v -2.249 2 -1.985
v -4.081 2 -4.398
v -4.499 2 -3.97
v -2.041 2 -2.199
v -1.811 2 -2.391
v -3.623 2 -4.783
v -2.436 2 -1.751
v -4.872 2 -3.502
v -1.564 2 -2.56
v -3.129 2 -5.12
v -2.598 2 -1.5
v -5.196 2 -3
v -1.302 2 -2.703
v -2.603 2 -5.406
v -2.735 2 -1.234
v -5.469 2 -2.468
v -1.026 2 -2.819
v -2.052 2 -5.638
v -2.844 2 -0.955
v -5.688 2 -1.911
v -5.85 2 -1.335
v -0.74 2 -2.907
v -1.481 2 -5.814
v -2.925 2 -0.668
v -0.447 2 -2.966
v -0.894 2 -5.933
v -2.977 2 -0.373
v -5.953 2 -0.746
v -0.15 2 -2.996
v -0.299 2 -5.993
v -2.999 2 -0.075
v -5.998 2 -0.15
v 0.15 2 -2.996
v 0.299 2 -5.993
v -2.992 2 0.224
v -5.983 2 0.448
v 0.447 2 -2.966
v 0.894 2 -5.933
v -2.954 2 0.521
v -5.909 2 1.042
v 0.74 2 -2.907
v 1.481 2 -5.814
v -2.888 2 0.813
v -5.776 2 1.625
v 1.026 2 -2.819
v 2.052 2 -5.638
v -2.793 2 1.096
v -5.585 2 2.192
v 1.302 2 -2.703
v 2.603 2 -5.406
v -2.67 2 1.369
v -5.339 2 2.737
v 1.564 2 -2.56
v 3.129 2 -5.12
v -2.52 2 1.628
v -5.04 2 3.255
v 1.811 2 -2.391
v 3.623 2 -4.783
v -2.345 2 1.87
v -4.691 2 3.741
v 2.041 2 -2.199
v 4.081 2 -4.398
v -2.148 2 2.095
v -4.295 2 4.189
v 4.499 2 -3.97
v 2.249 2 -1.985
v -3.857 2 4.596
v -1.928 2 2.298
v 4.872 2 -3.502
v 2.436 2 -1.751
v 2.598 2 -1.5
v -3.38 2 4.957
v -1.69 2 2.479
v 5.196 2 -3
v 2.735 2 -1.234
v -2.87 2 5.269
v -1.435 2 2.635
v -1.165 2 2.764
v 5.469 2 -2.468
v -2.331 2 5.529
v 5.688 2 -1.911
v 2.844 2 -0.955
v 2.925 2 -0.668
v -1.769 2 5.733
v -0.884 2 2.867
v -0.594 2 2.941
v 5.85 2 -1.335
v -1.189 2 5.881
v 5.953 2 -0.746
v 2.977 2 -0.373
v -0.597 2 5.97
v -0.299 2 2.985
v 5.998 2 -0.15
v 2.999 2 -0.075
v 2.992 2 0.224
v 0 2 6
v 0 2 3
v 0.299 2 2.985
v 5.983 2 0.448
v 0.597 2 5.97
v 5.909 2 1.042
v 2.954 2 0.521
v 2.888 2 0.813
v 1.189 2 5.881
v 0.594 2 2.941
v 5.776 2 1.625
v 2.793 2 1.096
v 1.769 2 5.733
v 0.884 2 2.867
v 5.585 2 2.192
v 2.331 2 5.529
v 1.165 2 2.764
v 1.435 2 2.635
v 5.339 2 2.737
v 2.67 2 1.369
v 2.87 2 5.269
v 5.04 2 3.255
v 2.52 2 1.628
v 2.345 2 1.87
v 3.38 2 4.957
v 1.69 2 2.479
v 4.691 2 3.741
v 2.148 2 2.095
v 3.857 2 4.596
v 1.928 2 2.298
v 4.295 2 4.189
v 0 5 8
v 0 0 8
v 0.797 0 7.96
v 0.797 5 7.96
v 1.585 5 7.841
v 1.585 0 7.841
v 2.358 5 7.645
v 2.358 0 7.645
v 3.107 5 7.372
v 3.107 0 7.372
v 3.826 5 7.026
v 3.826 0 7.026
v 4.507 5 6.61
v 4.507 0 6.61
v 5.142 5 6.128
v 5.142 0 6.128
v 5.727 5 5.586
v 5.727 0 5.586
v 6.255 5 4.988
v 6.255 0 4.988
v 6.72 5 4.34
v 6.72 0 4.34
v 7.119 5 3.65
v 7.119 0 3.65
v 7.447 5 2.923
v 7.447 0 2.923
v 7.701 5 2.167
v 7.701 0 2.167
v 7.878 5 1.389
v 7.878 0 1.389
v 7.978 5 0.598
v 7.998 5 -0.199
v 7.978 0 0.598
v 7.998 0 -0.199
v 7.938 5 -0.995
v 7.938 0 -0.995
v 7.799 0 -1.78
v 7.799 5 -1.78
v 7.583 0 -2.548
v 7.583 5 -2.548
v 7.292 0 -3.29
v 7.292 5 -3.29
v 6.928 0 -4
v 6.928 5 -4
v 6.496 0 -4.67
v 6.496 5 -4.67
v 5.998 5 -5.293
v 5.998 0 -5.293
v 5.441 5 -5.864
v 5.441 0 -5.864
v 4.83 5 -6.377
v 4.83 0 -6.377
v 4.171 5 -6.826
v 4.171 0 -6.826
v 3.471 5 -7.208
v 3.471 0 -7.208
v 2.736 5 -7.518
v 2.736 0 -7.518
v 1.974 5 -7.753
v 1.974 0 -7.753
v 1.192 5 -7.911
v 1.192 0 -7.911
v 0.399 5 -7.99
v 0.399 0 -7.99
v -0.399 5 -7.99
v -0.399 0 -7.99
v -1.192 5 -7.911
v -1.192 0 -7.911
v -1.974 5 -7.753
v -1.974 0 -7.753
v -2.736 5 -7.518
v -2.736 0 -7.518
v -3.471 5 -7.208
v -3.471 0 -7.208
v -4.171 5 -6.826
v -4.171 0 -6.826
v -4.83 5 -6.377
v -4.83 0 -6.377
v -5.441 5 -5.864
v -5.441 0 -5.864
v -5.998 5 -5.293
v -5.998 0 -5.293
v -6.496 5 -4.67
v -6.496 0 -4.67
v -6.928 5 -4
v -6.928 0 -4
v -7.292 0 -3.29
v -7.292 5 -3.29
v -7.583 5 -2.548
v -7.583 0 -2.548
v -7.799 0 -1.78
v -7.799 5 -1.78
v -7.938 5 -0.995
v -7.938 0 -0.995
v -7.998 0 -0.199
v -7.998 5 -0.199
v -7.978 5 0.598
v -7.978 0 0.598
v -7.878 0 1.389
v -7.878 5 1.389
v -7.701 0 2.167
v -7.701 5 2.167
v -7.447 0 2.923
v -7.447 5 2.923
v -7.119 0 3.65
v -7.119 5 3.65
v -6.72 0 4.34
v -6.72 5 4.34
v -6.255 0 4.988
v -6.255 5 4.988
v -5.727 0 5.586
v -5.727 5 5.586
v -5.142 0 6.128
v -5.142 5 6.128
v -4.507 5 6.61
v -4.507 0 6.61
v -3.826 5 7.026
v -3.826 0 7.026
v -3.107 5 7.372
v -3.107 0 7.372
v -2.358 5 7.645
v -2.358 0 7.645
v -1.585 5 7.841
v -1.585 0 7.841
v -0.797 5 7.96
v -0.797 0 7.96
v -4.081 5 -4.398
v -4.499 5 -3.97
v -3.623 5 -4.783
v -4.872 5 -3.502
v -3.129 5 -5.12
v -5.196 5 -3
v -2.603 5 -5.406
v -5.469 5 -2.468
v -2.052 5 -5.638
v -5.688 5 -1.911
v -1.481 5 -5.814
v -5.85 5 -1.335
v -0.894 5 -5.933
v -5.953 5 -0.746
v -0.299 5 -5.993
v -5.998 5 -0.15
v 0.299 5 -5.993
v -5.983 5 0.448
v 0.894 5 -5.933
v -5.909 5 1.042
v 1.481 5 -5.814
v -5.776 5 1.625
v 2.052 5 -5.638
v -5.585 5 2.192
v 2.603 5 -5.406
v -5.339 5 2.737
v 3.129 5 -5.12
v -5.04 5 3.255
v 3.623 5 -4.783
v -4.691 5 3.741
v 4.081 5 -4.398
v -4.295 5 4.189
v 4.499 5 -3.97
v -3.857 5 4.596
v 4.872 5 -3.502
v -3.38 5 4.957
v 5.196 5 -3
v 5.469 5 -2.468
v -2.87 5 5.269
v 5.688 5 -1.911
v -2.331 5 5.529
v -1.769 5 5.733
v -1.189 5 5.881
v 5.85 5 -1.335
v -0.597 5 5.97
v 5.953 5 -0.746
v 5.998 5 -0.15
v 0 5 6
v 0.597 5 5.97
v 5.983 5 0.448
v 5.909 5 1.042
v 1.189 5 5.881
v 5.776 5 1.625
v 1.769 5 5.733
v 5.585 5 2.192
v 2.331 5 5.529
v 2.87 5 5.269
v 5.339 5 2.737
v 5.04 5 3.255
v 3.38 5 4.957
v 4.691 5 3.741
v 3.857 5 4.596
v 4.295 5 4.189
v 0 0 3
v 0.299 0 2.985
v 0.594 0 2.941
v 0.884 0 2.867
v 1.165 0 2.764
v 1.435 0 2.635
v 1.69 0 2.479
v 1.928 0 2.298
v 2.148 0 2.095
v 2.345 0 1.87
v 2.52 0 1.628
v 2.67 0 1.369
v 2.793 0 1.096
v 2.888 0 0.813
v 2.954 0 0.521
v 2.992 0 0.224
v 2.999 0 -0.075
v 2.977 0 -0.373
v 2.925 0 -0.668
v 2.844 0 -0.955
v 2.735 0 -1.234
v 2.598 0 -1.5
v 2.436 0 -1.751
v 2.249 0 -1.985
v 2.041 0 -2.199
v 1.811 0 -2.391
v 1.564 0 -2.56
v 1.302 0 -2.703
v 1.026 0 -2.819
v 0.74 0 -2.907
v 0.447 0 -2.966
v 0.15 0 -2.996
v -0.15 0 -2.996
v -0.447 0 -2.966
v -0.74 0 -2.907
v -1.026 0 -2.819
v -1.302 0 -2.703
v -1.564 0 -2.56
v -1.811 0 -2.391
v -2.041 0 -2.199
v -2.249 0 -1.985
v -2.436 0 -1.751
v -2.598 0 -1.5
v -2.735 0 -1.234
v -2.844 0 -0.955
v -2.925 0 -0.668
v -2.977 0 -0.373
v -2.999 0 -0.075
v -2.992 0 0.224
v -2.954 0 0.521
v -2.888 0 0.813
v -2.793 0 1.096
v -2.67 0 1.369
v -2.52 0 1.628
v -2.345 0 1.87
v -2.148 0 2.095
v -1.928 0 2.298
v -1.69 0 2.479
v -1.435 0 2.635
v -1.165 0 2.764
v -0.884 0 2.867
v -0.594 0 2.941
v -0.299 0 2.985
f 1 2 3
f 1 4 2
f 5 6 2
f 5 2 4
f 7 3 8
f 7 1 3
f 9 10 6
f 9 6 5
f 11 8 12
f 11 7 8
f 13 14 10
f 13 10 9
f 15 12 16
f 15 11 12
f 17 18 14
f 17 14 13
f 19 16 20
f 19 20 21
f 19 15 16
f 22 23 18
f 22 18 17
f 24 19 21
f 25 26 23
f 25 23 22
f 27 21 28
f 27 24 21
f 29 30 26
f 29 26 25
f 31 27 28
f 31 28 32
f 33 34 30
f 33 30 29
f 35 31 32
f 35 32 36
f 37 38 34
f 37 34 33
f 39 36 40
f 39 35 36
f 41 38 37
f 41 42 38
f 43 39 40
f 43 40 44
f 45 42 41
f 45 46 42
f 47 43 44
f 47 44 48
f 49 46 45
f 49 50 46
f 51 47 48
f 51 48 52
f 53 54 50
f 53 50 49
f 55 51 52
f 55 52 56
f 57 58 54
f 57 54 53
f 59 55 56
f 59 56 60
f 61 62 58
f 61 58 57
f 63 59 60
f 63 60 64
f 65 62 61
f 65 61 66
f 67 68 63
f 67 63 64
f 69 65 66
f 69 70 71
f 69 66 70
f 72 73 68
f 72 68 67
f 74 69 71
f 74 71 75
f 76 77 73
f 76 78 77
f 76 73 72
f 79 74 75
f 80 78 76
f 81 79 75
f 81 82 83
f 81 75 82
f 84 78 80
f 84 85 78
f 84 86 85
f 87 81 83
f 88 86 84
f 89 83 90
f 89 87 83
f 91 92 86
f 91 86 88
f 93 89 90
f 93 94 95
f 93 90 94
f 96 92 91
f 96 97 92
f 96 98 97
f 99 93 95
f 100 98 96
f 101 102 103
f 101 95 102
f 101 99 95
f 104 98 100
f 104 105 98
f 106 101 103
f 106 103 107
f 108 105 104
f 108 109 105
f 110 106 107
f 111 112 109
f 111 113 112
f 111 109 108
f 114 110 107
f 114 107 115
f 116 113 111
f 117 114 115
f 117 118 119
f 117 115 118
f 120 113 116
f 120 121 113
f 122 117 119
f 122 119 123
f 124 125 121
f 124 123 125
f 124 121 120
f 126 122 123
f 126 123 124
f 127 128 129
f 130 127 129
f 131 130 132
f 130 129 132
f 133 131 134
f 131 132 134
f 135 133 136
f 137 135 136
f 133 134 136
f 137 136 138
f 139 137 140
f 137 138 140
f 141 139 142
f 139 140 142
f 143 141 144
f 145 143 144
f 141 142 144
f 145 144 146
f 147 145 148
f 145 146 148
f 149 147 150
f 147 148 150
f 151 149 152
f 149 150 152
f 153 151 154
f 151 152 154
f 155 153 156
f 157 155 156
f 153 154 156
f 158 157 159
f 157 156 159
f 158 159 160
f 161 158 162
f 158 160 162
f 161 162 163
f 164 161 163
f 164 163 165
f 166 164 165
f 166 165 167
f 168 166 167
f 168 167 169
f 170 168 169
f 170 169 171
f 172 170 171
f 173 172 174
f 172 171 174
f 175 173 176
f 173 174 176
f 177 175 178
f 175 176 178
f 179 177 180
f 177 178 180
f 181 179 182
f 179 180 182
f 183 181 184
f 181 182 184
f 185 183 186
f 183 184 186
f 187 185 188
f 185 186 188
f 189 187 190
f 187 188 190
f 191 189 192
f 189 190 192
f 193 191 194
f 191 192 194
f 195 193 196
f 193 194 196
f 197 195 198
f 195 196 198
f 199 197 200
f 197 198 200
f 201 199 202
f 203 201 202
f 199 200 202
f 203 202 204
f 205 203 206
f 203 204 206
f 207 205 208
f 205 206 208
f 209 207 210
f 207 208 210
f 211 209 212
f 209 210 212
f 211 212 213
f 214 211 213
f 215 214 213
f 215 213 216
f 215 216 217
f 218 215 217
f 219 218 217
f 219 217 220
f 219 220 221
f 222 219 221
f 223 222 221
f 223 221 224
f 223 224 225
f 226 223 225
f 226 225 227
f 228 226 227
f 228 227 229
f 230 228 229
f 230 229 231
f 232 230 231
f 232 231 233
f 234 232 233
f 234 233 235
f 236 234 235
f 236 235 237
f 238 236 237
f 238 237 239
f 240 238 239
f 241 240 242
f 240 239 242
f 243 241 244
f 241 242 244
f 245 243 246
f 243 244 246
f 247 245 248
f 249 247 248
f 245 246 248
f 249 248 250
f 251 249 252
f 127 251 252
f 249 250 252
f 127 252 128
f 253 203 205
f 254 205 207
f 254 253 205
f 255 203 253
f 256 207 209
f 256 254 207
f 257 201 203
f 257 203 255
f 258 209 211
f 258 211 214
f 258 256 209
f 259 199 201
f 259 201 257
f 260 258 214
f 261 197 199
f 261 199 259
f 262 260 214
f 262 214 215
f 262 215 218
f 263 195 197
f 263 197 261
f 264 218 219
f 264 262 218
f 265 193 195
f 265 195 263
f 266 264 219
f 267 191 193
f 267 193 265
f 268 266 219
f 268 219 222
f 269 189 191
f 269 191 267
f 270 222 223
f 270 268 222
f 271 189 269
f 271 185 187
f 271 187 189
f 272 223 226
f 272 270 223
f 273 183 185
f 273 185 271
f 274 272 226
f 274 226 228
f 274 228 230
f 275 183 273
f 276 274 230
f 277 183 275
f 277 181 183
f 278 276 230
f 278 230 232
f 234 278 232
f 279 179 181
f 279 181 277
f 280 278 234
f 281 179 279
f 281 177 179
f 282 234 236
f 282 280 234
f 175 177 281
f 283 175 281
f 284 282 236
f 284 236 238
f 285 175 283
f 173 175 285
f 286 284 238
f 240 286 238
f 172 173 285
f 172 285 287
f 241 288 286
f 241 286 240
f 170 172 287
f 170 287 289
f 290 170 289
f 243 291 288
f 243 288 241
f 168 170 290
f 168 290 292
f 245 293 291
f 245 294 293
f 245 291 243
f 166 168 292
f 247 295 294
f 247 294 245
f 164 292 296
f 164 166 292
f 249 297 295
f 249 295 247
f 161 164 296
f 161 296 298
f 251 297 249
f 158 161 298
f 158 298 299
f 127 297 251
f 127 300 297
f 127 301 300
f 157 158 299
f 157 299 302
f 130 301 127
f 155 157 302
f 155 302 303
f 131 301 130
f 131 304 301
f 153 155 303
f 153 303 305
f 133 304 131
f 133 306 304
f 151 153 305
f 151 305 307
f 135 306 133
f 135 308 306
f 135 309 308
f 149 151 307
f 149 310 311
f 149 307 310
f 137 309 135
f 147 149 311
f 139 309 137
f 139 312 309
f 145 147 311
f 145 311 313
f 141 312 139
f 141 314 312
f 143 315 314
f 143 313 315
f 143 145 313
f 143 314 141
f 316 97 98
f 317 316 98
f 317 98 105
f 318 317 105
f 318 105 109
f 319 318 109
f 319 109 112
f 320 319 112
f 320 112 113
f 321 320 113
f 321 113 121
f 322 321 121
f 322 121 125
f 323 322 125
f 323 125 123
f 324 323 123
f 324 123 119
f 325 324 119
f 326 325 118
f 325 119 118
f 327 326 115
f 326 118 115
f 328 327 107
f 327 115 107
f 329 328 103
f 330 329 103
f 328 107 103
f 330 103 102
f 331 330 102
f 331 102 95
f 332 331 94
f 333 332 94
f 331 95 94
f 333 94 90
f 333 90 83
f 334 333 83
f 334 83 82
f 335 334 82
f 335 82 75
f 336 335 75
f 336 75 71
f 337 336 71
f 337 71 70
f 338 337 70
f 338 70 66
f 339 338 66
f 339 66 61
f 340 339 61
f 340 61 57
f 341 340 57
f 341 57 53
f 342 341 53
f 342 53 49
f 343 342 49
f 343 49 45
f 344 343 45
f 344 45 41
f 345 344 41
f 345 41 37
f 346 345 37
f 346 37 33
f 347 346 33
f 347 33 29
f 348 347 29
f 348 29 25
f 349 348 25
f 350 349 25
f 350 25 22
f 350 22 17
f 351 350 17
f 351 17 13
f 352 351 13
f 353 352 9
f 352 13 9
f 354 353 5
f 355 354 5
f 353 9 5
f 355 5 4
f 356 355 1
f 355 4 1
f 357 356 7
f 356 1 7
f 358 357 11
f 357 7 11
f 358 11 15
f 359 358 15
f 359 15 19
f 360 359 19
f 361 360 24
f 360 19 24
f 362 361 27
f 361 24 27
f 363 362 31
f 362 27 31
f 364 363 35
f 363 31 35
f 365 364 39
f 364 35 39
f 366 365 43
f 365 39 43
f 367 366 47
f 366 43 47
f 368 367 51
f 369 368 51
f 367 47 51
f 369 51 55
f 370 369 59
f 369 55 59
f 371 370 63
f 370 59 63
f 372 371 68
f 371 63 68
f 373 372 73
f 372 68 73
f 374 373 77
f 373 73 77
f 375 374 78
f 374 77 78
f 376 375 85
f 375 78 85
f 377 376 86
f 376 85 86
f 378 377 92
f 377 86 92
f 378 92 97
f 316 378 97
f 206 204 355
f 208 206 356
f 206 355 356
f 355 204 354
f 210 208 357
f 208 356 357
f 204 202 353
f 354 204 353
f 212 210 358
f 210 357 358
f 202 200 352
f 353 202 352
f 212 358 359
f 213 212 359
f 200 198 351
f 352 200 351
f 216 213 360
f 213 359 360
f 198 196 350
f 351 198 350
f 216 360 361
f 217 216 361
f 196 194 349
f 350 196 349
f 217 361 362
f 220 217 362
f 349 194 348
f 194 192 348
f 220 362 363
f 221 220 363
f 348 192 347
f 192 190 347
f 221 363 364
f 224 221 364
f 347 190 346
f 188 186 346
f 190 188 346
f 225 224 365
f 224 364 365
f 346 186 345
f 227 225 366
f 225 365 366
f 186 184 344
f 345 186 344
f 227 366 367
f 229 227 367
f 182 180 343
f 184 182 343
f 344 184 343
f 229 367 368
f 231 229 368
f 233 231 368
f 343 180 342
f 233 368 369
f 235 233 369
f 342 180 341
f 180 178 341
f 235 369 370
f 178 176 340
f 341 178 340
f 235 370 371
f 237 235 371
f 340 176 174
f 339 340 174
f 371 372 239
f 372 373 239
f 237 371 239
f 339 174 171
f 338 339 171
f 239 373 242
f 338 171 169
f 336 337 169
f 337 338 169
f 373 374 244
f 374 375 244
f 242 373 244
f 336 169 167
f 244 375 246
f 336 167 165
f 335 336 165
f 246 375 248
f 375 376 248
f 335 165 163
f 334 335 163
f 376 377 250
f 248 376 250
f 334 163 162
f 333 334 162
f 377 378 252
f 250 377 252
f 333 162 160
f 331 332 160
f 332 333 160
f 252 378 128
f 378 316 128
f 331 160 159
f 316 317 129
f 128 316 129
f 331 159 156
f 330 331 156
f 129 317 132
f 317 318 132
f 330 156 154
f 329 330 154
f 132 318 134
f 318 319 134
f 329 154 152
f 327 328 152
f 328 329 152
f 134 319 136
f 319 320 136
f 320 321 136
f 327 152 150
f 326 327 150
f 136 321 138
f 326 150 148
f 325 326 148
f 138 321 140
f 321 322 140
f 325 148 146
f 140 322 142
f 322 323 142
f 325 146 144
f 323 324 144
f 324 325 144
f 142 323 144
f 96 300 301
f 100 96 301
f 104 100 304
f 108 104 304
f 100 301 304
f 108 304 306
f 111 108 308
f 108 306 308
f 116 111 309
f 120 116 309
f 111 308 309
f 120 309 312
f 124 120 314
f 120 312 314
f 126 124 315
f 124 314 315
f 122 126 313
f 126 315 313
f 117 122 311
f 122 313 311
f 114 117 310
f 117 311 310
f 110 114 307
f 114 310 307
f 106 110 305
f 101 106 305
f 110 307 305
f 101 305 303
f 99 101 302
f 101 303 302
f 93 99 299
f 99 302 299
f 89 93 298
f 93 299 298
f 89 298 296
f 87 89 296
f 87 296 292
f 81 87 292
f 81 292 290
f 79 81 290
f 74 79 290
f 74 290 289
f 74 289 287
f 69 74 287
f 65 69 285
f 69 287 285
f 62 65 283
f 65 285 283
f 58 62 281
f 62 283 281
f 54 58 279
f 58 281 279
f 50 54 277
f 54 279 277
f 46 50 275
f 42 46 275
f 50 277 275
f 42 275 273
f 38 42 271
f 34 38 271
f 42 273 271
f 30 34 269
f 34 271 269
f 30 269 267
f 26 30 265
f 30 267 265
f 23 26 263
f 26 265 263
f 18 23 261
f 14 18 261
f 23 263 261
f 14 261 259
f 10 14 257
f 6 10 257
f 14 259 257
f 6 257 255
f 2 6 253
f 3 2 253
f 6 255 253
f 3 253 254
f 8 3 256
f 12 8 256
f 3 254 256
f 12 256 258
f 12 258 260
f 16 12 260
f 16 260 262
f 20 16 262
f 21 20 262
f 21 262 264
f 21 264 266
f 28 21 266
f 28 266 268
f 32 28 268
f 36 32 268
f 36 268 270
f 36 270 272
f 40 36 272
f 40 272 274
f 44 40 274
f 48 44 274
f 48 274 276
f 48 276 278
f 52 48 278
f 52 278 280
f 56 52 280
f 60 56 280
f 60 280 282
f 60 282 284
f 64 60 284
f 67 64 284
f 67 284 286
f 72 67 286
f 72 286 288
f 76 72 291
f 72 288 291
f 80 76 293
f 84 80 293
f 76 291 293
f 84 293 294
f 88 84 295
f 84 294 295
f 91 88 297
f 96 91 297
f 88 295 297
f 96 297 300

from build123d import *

# Parameters (mm, degrees)
SKETCH_1_R          = 8
EXTRUDE_1_DEPTH     = 5
SKETCH_2_R          = 6
CUT_EXTRUDE_1_DEPTH = 3
SKETCH_3_R          = 3
CUT_EXTRUDE_2_DEPTH = 12.704699911


with BuildPart() as part:
    # 草图1 → 凸台-拉伸1 (new body)
    with BuildSketch(Plane(origin=(0, 0, 0), x_dir=(1, 0, 0), z_dir=(0, 1, 0))):
        with Locations(Location((0, 0, 0), (0, 0, 270))):
            Circle(SKETCH_1_R)
    extrude(amount=EXTRUDE_1_DEPTH)

    # 草图2 → 切除-拉伸1 (cut)
    with BuildSketch(Plane(origin=(0, 5, 0), x_dir=(1, 0, 0), z_dir=(0, 1, 0))):
        with Locations(Location((0, 0, 0), (0, 0, 270))):
            Circle(SKETCH_2_R)
    extrude(amount=-CUT_EXTRUDE_1_DEPTH, mode=Mode.SUBTRACT)

    # 草图3 → 切除-拉伸2 (cut, through all)
    with BuildSketch(Plane(origin=(0, 2, 0), x_dir=(1, 0, 0), z_dir=(0, 1, 0))):
        with Locations(Location((0, 0, 0), (0, 0, 270))):
            Circle(SKETCH_3_R)
    extrude(amount=-CUT_EXTRUDE_2_DEPTH, mode=Mode.SUBTRACT)


solid = part.part
